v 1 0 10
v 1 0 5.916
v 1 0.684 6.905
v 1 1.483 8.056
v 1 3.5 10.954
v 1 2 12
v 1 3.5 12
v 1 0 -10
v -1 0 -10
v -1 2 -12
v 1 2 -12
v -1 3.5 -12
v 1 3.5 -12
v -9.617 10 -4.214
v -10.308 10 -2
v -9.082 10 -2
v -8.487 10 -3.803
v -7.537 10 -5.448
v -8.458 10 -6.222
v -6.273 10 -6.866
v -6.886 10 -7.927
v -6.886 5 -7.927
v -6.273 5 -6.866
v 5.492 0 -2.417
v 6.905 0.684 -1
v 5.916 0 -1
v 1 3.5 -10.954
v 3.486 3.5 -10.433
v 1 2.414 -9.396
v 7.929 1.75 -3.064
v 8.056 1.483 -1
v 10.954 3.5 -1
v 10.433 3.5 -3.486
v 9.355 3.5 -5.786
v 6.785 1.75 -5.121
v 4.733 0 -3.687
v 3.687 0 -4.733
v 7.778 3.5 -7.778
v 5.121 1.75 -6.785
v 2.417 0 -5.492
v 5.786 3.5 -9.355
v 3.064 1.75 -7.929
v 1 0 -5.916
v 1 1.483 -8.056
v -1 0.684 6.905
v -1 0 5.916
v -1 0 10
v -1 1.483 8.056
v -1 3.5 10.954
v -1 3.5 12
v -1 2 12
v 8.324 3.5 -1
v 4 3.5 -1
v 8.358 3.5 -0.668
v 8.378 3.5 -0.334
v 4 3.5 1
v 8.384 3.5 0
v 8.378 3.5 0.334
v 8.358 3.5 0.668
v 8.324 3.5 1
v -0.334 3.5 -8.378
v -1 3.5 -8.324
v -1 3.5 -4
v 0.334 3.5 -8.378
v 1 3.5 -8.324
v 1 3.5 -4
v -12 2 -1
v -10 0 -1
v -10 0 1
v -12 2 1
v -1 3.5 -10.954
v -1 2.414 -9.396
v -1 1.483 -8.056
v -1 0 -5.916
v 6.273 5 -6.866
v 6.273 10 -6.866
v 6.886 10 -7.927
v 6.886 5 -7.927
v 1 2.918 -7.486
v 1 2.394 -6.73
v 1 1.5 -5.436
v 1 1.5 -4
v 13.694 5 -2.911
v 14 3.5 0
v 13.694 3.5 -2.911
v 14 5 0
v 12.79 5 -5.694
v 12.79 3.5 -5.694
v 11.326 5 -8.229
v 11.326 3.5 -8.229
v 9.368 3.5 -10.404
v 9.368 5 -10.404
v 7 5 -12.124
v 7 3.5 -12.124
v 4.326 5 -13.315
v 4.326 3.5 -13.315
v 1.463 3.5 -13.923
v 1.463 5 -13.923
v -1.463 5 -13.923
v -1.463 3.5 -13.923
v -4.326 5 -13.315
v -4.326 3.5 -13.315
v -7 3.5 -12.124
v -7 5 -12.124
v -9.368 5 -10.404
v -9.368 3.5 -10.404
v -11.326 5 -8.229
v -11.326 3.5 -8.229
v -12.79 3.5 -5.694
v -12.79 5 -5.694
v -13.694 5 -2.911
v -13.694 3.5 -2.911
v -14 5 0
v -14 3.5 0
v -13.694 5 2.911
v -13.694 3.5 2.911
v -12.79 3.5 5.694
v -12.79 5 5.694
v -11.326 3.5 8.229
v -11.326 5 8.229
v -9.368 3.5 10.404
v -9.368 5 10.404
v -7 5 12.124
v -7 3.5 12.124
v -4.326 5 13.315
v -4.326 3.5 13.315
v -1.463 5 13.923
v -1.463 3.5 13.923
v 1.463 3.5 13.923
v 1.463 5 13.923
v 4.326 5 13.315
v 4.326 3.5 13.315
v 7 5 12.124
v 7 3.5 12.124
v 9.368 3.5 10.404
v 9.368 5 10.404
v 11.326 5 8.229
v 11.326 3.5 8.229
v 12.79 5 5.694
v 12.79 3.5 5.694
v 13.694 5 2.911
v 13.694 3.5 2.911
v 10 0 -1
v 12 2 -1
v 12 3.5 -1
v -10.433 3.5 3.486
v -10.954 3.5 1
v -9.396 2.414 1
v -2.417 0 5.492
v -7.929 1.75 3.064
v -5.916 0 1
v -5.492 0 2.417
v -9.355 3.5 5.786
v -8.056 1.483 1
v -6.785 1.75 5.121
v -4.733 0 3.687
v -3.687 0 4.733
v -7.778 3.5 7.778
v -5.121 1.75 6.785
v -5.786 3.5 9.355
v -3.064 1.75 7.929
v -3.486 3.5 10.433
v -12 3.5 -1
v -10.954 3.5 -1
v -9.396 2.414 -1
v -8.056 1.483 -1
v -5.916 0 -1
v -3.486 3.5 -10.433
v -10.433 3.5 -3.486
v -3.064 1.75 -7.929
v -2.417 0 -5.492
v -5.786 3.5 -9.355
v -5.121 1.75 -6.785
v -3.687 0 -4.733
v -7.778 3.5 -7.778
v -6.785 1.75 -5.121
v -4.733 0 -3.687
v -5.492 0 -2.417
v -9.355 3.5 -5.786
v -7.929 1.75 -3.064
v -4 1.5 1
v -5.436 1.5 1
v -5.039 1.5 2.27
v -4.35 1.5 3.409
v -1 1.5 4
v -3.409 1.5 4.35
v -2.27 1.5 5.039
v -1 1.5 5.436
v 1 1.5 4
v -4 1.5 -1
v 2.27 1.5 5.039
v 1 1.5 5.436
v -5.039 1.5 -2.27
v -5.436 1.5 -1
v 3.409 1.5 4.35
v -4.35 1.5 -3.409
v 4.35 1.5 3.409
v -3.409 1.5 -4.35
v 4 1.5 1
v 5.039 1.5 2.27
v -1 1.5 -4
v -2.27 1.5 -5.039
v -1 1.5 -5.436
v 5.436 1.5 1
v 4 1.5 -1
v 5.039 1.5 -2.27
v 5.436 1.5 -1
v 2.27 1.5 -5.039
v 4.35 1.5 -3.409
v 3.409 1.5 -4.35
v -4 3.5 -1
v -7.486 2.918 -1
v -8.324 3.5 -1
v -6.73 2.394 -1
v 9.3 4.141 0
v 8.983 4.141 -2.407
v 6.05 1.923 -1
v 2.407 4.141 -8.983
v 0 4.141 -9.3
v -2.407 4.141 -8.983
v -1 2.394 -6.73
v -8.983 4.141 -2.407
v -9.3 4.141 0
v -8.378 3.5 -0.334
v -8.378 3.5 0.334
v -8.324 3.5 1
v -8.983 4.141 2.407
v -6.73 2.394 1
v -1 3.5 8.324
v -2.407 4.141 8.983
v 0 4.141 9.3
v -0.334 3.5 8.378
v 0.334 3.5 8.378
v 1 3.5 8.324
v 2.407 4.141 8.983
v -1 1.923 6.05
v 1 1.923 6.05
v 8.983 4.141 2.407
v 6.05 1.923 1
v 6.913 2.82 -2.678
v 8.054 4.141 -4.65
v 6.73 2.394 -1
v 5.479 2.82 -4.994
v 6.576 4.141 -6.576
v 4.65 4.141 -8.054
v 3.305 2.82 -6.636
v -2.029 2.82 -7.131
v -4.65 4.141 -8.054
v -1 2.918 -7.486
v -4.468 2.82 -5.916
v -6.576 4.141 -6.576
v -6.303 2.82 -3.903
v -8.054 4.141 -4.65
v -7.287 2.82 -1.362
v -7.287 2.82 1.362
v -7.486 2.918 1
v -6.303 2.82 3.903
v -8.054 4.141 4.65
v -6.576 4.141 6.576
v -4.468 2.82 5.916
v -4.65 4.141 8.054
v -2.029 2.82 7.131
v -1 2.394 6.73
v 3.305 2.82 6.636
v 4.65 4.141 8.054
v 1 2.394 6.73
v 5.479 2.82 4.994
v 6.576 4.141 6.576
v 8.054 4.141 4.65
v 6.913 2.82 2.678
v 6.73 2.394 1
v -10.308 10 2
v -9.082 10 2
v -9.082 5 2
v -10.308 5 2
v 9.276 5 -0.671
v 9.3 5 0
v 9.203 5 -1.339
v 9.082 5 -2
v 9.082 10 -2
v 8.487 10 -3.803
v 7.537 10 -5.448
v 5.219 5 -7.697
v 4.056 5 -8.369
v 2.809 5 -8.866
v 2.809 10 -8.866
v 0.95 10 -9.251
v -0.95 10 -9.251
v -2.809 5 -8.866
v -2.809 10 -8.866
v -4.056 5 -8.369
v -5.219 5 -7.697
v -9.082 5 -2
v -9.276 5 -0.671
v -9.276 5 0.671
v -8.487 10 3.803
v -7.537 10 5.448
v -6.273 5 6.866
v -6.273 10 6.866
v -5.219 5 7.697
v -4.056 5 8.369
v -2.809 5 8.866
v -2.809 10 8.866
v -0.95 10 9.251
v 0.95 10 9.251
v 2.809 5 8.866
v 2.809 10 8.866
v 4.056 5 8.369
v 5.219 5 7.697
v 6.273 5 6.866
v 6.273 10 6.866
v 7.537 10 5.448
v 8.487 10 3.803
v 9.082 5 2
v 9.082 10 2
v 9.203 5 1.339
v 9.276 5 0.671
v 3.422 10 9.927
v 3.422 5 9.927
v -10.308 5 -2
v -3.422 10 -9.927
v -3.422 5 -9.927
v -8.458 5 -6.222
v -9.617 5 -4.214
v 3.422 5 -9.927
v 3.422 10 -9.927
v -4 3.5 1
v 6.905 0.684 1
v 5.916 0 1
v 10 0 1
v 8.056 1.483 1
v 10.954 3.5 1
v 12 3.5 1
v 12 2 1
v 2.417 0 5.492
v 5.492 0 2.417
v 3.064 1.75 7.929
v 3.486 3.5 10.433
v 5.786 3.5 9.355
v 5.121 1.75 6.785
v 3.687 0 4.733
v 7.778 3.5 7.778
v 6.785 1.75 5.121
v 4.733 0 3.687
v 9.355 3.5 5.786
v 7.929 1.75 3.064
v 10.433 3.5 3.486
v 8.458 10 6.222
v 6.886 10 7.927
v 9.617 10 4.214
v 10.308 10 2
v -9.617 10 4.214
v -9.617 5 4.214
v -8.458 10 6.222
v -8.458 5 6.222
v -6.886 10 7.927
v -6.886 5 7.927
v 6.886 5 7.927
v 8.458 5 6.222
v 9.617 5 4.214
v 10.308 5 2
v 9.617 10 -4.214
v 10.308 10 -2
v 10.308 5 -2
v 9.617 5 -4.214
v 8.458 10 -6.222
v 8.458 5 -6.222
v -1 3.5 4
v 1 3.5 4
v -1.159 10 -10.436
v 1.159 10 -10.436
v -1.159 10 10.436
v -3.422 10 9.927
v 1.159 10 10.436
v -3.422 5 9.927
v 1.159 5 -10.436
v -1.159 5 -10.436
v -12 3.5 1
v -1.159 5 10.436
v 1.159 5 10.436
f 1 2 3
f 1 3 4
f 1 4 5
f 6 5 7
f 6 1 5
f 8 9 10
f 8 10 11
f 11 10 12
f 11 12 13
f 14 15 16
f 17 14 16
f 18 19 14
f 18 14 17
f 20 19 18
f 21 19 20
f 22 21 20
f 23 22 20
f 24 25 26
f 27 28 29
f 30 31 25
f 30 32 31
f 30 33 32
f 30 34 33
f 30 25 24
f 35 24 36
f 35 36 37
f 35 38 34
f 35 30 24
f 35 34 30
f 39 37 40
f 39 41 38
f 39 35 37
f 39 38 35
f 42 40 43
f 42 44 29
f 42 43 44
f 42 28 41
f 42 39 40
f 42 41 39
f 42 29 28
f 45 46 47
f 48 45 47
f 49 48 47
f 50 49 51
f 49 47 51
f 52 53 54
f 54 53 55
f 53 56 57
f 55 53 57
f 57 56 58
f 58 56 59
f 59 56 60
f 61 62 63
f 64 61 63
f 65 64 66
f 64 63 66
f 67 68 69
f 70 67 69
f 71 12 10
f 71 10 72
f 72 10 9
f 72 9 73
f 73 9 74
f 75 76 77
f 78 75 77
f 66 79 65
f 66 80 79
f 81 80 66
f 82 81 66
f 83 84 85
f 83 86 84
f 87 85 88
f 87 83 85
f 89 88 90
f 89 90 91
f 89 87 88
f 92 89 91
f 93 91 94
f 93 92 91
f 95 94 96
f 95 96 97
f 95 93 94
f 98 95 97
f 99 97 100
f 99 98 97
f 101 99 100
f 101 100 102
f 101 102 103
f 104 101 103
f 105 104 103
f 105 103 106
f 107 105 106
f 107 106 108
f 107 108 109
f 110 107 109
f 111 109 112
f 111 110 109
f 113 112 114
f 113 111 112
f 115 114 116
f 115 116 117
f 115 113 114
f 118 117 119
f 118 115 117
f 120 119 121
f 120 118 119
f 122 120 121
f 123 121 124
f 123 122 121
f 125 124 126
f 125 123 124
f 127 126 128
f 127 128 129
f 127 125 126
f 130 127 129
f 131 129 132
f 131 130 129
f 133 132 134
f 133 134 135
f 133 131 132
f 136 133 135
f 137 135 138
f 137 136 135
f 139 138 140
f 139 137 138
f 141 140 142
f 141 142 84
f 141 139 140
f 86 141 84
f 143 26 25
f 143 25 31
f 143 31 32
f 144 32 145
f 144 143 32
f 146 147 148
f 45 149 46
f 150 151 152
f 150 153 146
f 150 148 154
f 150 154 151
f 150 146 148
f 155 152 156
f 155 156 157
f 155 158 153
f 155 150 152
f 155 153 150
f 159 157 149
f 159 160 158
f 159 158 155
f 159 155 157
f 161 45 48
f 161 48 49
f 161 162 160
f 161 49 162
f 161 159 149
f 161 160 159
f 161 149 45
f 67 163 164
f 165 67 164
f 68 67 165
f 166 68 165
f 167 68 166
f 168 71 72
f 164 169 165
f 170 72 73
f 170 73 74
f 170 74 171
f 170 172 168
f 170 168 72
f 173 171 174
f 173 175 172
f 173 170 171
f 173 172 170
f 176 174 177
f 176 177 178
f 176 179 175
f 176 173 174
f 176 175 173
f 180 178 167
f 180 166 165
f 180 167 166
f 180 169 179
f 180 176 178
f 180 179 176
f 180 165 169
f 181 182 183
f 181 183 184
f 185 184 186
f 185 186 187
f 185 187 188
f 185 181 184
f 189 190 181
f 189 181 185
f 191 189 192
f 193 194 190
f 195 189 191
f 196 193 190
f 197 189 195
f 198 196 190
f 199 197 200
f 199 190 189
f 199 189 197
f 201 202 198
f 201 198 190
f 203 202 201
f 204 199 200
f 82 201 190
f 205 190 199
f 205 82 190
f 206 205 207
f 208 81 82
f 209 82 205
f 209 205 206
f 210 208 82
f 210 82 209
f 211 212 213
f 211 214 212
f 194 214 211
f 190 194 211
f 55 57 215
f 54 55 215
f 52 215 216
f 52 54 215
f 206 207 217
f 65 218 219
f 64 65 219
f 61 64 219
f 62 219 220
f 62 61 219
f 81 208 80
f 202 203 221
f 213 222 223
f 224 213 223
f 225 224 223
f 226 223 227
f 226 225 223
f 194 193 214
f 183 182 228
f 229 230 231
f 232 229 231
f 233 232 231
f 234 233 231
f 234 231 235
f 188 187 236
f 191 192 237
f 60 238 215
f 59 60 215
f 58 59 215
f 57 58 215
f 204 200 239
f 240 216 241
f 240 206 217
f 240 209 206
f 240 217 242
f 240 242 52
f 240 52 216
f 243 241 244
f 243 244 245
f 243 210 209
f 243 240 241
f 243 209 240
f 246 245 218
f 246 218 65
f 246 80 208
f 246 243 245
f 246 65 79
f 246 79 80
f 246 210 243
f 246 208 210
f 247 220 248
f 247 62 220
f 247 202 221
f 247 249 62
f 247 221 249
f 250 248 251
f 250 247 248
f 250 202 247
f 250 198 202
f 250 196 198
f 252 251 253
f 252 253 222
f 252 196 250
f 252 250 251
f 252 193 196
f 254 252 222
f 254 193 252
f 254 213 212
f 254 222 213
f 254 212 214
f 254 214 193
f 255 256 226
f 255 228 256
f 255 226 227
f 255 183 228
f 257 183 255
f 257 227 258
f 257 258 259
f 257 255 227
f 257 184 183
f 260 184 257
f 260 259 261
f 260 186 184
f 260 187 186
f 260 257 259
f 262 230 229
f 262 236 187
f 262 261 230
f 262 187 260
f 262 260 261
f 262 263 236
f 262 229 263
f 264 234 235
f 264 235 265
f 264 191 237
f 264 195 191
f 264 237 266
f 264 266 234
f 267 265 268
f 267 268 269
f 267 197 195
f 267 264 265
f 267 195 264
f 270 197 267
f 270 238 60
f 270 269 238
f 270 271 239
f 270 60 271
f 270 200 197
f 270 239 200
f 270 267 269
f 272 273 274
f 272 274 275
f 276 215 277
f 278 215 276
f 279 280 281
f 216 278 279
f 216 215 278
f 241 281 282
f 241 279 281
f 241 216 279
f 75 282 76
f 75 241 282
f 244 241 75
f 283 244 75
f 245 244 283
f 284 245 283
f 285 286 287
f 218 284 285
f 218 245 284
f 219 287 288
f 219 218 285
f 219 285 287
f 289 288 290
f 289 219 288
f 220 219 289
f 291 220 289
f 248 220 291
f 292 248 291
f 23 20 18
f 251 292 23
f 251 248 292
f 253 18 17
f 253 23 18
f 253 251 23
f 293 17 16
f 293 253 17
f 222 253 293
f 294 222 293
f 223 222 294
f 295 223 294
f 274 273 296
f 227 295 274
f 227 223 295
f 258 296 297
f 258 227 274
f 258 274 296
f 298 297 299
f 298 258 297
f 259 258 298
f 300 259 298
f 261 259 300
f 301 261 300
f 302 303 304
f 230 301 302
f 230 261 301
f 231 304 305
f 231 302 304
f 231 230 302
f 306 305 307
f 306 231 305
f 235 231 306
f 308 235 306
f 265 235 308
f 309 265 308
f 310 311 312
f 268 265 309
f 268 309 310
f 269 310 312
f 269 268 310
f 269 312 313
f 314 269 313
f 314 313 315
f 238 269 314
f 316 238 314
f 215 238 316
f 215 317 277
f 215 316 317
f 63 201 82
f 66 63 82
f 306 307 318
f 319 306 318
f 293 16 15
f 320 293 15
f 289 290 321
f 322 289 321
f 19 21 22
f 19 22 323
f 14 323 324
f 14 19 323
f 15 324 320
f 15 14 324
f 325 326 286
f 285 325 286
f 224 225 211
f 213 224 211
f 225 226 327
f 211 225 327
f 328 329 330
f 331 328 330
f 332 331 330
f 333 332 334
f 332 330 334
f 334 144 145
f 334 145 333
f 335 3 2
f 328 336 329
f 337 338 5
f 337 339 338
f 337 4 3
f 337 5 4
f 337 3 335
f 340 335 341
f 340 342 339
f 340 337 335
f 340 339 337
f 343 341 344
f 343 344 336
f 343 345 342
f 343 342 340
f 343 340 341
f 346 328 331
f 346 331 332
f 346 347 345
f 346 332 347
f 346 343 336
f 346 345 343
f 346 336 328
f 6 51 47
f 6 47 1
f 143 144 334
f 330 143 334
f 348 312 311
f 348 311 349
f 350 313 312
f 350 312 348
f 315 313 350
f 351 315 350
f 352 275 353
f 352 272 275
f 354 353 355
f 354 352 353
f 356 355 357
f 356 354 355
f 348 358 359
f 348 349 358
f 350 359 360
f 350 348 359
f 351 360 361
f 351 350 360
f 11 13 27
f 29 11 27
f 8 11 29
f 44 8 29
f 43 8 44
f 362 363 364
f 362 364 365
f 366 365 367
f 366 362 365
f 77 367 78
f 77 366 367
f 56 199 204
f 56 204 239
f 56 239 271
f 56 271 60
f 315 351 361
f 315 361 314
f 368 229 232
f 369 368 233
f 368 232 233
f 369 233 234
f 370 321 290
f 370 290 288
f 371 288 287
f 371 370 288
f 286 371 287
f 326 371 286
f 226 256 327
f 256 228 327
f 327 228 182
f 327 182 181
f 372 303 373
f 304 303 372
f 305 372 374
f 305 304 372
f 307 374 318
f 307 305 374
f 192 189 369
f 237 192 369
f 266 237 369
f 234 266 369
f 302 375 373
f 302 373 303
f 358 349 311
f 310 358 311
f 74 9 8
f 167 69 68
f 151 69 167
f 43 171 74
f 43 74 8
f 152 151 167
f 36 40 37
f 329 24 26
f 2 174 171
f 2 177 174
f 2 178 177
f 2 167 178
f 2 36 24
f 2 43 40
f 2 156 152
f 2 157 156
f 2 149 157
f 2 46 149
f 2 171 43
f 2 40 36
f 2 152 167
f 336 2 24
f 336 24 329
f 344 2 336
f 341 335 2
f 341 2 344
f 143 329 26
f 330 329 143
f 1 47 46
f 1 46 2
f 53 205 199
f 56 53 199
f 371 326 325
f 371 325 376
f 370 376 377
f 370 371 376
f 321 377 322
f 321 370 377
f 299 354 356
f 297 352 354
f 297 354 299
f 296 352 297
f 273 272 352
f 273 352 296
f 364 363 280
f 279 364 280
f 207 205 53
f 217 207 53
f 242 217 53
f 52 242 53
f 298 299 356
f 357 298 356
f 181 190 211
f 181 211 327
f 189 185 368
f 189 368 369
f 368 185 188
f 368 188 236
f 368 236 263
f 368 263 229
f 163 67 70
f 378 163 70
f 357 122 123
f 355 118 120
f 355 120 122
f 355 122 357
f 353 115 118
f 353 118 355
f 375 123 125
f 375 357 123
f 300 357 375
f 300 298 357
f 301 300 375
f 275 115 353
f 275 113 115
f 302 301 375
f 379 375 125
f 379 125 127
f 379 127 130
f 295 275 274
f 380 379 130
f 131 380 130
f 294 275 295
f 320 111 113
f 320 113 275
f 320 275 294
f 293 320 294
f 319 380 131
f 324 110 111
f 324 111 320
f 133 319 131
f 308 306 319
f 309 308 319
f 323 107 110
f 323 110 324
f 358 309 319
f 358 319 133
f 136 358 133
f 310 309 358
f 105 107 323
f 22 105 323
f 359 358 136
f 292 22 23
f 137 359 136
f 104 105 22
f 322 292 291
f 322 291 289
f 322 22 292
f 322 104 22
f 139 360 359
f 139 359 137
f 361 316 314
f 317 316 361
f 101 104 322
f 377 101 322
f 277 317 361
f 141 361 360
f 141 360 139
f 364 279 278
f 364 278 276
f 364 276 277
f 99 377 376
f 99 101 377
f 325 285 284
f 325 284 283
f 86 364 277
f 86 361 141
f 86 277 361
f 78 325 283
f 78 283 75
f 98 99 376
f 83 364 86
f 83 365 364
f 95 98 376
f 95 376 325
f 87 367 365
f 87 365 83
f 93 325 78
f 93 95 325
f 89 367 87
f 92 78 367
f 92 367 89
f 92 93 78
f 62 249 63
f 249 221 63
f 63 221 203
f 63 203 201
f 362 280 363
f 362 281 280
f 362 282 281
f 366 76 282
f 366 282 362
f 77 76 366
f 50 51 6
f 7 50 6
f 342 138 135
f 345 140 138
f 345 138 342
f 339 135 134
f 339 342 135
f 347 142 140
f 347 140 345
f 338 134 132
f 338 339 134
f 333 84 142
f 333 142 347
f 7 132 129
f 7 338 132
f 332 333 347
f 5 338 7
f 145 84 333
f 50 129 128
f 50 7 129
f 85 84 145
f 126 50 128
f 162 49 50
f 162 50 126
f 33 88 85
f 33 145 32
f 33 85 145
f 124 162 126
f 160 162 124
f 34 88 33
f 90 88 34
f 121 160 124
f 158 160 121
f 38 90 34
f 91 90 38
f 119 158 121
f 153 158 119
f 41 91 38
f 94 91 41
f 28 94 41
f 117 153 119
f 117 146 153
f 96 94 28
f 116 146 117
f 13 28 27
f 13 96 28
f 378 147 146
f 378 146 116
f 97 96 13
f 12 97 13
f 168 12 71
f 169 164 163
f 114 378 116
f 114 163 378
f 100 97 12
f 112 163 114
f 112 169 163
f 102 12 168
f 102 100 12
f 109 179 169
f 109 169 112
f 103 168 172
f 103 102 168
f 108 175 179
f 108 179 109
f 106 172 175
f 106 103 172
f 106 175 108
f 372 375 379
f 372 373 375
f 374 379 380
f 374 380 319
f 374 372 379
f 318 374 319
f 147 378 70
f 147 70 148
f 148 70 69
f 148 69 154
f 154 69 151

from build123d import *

# Parameters (mm, degrees)
F2_W     = 3.9979876956
F2_H     = 4
F3_DEPTH = 5
F4_W     = 8
F4_H     = 2
F4_W_2   = 2
F4_H_2   = 8
F5_DEPTH = 3.5
F6_SIZE  = 2


with BuildPart() as f1:
    # F0 (on Top) → F1 (revolve)
    with BuildSketch(Plane.XY):
        Polygon((0, 1.5), (0, 0), (6, 0), (11, 3.5), (14, 3.5), (14, 5), (10.5, 5), (10.5, 10), (9.3, 10), (9.3, 4.1409833424), (5.5271666538, 1.5), align=None)
    revolve(axis=Axis((0, 5.6900531054, 0), (0, 1, 0)))

    # F2 (on face) → F3 (cut, through all)
    with BuildSketch(Plane(origin=(0, 10, 0), x_dir=(-1, 0, 0), z_dir=(0, 1, 0))):
        with Locations((9.9453665316, 0)):
            Rectangle(F2_W, F2_H)
        Polygon((4.2401293821, 11.3441195205), (2.2411355343, 7.8817606121), (5.7052371495, 5.8817606121), (7.7042309973, 9.3441195205), align=None)
        Polygon((-7.7042309973, 9.3441195205), (-5.7052371495, 5.8817606121), (-2.2411355343, 7.8817606121), (-4.2401293821, 11.3441195205), align=None)
        with Locations((-9.9453665316, 0)):
            Rectangle(F2_W, F2_H)
        Polygon((-4.2401293821, -11.3441195205), (-2.2411355343, -7.8817606121), (-5.7052371495, -5.8817606121), (-7.7042309973, -9.3441195205), align=None)
        Polygon((7.7042309973, -9.3441195205), (5.7052371495, -5.8817606121), (2.2411355343, -7.8817606121), (4.2401293821, -11.3441195205), align=None)
    extrude(amount=-F3_DEPTH, mode=Mode.SUBTRACT)

    # F4 (on face) → F5 (join, through all)
    with BuildSketch(Plane.XZ):
        with Locations((-8, 0)):
            Rectangle(F4_W, F4_H)
        with Locations((0, -8)):
            Rectangle(F4_W_2, F4_H_2)
        with Locations((8, 0)):
            Rectangle(F4_W, F4_H)
        with Locations((0, 8)):
            Rectangle(F4_W_2, F4_H_2)
    extrude(amount=-F5_DEPTH)

    # F6
    f6_edges = [f1.edges().sort_by_distance(p)[0] for p in [
        (-12, 0, 0),
        (0, 0, -12),
        (12, 0, 0),
        (0, 0, 12),
    ]]
    chamfer(f6_edges, length=F6_SIZE)


solid = f1.part
